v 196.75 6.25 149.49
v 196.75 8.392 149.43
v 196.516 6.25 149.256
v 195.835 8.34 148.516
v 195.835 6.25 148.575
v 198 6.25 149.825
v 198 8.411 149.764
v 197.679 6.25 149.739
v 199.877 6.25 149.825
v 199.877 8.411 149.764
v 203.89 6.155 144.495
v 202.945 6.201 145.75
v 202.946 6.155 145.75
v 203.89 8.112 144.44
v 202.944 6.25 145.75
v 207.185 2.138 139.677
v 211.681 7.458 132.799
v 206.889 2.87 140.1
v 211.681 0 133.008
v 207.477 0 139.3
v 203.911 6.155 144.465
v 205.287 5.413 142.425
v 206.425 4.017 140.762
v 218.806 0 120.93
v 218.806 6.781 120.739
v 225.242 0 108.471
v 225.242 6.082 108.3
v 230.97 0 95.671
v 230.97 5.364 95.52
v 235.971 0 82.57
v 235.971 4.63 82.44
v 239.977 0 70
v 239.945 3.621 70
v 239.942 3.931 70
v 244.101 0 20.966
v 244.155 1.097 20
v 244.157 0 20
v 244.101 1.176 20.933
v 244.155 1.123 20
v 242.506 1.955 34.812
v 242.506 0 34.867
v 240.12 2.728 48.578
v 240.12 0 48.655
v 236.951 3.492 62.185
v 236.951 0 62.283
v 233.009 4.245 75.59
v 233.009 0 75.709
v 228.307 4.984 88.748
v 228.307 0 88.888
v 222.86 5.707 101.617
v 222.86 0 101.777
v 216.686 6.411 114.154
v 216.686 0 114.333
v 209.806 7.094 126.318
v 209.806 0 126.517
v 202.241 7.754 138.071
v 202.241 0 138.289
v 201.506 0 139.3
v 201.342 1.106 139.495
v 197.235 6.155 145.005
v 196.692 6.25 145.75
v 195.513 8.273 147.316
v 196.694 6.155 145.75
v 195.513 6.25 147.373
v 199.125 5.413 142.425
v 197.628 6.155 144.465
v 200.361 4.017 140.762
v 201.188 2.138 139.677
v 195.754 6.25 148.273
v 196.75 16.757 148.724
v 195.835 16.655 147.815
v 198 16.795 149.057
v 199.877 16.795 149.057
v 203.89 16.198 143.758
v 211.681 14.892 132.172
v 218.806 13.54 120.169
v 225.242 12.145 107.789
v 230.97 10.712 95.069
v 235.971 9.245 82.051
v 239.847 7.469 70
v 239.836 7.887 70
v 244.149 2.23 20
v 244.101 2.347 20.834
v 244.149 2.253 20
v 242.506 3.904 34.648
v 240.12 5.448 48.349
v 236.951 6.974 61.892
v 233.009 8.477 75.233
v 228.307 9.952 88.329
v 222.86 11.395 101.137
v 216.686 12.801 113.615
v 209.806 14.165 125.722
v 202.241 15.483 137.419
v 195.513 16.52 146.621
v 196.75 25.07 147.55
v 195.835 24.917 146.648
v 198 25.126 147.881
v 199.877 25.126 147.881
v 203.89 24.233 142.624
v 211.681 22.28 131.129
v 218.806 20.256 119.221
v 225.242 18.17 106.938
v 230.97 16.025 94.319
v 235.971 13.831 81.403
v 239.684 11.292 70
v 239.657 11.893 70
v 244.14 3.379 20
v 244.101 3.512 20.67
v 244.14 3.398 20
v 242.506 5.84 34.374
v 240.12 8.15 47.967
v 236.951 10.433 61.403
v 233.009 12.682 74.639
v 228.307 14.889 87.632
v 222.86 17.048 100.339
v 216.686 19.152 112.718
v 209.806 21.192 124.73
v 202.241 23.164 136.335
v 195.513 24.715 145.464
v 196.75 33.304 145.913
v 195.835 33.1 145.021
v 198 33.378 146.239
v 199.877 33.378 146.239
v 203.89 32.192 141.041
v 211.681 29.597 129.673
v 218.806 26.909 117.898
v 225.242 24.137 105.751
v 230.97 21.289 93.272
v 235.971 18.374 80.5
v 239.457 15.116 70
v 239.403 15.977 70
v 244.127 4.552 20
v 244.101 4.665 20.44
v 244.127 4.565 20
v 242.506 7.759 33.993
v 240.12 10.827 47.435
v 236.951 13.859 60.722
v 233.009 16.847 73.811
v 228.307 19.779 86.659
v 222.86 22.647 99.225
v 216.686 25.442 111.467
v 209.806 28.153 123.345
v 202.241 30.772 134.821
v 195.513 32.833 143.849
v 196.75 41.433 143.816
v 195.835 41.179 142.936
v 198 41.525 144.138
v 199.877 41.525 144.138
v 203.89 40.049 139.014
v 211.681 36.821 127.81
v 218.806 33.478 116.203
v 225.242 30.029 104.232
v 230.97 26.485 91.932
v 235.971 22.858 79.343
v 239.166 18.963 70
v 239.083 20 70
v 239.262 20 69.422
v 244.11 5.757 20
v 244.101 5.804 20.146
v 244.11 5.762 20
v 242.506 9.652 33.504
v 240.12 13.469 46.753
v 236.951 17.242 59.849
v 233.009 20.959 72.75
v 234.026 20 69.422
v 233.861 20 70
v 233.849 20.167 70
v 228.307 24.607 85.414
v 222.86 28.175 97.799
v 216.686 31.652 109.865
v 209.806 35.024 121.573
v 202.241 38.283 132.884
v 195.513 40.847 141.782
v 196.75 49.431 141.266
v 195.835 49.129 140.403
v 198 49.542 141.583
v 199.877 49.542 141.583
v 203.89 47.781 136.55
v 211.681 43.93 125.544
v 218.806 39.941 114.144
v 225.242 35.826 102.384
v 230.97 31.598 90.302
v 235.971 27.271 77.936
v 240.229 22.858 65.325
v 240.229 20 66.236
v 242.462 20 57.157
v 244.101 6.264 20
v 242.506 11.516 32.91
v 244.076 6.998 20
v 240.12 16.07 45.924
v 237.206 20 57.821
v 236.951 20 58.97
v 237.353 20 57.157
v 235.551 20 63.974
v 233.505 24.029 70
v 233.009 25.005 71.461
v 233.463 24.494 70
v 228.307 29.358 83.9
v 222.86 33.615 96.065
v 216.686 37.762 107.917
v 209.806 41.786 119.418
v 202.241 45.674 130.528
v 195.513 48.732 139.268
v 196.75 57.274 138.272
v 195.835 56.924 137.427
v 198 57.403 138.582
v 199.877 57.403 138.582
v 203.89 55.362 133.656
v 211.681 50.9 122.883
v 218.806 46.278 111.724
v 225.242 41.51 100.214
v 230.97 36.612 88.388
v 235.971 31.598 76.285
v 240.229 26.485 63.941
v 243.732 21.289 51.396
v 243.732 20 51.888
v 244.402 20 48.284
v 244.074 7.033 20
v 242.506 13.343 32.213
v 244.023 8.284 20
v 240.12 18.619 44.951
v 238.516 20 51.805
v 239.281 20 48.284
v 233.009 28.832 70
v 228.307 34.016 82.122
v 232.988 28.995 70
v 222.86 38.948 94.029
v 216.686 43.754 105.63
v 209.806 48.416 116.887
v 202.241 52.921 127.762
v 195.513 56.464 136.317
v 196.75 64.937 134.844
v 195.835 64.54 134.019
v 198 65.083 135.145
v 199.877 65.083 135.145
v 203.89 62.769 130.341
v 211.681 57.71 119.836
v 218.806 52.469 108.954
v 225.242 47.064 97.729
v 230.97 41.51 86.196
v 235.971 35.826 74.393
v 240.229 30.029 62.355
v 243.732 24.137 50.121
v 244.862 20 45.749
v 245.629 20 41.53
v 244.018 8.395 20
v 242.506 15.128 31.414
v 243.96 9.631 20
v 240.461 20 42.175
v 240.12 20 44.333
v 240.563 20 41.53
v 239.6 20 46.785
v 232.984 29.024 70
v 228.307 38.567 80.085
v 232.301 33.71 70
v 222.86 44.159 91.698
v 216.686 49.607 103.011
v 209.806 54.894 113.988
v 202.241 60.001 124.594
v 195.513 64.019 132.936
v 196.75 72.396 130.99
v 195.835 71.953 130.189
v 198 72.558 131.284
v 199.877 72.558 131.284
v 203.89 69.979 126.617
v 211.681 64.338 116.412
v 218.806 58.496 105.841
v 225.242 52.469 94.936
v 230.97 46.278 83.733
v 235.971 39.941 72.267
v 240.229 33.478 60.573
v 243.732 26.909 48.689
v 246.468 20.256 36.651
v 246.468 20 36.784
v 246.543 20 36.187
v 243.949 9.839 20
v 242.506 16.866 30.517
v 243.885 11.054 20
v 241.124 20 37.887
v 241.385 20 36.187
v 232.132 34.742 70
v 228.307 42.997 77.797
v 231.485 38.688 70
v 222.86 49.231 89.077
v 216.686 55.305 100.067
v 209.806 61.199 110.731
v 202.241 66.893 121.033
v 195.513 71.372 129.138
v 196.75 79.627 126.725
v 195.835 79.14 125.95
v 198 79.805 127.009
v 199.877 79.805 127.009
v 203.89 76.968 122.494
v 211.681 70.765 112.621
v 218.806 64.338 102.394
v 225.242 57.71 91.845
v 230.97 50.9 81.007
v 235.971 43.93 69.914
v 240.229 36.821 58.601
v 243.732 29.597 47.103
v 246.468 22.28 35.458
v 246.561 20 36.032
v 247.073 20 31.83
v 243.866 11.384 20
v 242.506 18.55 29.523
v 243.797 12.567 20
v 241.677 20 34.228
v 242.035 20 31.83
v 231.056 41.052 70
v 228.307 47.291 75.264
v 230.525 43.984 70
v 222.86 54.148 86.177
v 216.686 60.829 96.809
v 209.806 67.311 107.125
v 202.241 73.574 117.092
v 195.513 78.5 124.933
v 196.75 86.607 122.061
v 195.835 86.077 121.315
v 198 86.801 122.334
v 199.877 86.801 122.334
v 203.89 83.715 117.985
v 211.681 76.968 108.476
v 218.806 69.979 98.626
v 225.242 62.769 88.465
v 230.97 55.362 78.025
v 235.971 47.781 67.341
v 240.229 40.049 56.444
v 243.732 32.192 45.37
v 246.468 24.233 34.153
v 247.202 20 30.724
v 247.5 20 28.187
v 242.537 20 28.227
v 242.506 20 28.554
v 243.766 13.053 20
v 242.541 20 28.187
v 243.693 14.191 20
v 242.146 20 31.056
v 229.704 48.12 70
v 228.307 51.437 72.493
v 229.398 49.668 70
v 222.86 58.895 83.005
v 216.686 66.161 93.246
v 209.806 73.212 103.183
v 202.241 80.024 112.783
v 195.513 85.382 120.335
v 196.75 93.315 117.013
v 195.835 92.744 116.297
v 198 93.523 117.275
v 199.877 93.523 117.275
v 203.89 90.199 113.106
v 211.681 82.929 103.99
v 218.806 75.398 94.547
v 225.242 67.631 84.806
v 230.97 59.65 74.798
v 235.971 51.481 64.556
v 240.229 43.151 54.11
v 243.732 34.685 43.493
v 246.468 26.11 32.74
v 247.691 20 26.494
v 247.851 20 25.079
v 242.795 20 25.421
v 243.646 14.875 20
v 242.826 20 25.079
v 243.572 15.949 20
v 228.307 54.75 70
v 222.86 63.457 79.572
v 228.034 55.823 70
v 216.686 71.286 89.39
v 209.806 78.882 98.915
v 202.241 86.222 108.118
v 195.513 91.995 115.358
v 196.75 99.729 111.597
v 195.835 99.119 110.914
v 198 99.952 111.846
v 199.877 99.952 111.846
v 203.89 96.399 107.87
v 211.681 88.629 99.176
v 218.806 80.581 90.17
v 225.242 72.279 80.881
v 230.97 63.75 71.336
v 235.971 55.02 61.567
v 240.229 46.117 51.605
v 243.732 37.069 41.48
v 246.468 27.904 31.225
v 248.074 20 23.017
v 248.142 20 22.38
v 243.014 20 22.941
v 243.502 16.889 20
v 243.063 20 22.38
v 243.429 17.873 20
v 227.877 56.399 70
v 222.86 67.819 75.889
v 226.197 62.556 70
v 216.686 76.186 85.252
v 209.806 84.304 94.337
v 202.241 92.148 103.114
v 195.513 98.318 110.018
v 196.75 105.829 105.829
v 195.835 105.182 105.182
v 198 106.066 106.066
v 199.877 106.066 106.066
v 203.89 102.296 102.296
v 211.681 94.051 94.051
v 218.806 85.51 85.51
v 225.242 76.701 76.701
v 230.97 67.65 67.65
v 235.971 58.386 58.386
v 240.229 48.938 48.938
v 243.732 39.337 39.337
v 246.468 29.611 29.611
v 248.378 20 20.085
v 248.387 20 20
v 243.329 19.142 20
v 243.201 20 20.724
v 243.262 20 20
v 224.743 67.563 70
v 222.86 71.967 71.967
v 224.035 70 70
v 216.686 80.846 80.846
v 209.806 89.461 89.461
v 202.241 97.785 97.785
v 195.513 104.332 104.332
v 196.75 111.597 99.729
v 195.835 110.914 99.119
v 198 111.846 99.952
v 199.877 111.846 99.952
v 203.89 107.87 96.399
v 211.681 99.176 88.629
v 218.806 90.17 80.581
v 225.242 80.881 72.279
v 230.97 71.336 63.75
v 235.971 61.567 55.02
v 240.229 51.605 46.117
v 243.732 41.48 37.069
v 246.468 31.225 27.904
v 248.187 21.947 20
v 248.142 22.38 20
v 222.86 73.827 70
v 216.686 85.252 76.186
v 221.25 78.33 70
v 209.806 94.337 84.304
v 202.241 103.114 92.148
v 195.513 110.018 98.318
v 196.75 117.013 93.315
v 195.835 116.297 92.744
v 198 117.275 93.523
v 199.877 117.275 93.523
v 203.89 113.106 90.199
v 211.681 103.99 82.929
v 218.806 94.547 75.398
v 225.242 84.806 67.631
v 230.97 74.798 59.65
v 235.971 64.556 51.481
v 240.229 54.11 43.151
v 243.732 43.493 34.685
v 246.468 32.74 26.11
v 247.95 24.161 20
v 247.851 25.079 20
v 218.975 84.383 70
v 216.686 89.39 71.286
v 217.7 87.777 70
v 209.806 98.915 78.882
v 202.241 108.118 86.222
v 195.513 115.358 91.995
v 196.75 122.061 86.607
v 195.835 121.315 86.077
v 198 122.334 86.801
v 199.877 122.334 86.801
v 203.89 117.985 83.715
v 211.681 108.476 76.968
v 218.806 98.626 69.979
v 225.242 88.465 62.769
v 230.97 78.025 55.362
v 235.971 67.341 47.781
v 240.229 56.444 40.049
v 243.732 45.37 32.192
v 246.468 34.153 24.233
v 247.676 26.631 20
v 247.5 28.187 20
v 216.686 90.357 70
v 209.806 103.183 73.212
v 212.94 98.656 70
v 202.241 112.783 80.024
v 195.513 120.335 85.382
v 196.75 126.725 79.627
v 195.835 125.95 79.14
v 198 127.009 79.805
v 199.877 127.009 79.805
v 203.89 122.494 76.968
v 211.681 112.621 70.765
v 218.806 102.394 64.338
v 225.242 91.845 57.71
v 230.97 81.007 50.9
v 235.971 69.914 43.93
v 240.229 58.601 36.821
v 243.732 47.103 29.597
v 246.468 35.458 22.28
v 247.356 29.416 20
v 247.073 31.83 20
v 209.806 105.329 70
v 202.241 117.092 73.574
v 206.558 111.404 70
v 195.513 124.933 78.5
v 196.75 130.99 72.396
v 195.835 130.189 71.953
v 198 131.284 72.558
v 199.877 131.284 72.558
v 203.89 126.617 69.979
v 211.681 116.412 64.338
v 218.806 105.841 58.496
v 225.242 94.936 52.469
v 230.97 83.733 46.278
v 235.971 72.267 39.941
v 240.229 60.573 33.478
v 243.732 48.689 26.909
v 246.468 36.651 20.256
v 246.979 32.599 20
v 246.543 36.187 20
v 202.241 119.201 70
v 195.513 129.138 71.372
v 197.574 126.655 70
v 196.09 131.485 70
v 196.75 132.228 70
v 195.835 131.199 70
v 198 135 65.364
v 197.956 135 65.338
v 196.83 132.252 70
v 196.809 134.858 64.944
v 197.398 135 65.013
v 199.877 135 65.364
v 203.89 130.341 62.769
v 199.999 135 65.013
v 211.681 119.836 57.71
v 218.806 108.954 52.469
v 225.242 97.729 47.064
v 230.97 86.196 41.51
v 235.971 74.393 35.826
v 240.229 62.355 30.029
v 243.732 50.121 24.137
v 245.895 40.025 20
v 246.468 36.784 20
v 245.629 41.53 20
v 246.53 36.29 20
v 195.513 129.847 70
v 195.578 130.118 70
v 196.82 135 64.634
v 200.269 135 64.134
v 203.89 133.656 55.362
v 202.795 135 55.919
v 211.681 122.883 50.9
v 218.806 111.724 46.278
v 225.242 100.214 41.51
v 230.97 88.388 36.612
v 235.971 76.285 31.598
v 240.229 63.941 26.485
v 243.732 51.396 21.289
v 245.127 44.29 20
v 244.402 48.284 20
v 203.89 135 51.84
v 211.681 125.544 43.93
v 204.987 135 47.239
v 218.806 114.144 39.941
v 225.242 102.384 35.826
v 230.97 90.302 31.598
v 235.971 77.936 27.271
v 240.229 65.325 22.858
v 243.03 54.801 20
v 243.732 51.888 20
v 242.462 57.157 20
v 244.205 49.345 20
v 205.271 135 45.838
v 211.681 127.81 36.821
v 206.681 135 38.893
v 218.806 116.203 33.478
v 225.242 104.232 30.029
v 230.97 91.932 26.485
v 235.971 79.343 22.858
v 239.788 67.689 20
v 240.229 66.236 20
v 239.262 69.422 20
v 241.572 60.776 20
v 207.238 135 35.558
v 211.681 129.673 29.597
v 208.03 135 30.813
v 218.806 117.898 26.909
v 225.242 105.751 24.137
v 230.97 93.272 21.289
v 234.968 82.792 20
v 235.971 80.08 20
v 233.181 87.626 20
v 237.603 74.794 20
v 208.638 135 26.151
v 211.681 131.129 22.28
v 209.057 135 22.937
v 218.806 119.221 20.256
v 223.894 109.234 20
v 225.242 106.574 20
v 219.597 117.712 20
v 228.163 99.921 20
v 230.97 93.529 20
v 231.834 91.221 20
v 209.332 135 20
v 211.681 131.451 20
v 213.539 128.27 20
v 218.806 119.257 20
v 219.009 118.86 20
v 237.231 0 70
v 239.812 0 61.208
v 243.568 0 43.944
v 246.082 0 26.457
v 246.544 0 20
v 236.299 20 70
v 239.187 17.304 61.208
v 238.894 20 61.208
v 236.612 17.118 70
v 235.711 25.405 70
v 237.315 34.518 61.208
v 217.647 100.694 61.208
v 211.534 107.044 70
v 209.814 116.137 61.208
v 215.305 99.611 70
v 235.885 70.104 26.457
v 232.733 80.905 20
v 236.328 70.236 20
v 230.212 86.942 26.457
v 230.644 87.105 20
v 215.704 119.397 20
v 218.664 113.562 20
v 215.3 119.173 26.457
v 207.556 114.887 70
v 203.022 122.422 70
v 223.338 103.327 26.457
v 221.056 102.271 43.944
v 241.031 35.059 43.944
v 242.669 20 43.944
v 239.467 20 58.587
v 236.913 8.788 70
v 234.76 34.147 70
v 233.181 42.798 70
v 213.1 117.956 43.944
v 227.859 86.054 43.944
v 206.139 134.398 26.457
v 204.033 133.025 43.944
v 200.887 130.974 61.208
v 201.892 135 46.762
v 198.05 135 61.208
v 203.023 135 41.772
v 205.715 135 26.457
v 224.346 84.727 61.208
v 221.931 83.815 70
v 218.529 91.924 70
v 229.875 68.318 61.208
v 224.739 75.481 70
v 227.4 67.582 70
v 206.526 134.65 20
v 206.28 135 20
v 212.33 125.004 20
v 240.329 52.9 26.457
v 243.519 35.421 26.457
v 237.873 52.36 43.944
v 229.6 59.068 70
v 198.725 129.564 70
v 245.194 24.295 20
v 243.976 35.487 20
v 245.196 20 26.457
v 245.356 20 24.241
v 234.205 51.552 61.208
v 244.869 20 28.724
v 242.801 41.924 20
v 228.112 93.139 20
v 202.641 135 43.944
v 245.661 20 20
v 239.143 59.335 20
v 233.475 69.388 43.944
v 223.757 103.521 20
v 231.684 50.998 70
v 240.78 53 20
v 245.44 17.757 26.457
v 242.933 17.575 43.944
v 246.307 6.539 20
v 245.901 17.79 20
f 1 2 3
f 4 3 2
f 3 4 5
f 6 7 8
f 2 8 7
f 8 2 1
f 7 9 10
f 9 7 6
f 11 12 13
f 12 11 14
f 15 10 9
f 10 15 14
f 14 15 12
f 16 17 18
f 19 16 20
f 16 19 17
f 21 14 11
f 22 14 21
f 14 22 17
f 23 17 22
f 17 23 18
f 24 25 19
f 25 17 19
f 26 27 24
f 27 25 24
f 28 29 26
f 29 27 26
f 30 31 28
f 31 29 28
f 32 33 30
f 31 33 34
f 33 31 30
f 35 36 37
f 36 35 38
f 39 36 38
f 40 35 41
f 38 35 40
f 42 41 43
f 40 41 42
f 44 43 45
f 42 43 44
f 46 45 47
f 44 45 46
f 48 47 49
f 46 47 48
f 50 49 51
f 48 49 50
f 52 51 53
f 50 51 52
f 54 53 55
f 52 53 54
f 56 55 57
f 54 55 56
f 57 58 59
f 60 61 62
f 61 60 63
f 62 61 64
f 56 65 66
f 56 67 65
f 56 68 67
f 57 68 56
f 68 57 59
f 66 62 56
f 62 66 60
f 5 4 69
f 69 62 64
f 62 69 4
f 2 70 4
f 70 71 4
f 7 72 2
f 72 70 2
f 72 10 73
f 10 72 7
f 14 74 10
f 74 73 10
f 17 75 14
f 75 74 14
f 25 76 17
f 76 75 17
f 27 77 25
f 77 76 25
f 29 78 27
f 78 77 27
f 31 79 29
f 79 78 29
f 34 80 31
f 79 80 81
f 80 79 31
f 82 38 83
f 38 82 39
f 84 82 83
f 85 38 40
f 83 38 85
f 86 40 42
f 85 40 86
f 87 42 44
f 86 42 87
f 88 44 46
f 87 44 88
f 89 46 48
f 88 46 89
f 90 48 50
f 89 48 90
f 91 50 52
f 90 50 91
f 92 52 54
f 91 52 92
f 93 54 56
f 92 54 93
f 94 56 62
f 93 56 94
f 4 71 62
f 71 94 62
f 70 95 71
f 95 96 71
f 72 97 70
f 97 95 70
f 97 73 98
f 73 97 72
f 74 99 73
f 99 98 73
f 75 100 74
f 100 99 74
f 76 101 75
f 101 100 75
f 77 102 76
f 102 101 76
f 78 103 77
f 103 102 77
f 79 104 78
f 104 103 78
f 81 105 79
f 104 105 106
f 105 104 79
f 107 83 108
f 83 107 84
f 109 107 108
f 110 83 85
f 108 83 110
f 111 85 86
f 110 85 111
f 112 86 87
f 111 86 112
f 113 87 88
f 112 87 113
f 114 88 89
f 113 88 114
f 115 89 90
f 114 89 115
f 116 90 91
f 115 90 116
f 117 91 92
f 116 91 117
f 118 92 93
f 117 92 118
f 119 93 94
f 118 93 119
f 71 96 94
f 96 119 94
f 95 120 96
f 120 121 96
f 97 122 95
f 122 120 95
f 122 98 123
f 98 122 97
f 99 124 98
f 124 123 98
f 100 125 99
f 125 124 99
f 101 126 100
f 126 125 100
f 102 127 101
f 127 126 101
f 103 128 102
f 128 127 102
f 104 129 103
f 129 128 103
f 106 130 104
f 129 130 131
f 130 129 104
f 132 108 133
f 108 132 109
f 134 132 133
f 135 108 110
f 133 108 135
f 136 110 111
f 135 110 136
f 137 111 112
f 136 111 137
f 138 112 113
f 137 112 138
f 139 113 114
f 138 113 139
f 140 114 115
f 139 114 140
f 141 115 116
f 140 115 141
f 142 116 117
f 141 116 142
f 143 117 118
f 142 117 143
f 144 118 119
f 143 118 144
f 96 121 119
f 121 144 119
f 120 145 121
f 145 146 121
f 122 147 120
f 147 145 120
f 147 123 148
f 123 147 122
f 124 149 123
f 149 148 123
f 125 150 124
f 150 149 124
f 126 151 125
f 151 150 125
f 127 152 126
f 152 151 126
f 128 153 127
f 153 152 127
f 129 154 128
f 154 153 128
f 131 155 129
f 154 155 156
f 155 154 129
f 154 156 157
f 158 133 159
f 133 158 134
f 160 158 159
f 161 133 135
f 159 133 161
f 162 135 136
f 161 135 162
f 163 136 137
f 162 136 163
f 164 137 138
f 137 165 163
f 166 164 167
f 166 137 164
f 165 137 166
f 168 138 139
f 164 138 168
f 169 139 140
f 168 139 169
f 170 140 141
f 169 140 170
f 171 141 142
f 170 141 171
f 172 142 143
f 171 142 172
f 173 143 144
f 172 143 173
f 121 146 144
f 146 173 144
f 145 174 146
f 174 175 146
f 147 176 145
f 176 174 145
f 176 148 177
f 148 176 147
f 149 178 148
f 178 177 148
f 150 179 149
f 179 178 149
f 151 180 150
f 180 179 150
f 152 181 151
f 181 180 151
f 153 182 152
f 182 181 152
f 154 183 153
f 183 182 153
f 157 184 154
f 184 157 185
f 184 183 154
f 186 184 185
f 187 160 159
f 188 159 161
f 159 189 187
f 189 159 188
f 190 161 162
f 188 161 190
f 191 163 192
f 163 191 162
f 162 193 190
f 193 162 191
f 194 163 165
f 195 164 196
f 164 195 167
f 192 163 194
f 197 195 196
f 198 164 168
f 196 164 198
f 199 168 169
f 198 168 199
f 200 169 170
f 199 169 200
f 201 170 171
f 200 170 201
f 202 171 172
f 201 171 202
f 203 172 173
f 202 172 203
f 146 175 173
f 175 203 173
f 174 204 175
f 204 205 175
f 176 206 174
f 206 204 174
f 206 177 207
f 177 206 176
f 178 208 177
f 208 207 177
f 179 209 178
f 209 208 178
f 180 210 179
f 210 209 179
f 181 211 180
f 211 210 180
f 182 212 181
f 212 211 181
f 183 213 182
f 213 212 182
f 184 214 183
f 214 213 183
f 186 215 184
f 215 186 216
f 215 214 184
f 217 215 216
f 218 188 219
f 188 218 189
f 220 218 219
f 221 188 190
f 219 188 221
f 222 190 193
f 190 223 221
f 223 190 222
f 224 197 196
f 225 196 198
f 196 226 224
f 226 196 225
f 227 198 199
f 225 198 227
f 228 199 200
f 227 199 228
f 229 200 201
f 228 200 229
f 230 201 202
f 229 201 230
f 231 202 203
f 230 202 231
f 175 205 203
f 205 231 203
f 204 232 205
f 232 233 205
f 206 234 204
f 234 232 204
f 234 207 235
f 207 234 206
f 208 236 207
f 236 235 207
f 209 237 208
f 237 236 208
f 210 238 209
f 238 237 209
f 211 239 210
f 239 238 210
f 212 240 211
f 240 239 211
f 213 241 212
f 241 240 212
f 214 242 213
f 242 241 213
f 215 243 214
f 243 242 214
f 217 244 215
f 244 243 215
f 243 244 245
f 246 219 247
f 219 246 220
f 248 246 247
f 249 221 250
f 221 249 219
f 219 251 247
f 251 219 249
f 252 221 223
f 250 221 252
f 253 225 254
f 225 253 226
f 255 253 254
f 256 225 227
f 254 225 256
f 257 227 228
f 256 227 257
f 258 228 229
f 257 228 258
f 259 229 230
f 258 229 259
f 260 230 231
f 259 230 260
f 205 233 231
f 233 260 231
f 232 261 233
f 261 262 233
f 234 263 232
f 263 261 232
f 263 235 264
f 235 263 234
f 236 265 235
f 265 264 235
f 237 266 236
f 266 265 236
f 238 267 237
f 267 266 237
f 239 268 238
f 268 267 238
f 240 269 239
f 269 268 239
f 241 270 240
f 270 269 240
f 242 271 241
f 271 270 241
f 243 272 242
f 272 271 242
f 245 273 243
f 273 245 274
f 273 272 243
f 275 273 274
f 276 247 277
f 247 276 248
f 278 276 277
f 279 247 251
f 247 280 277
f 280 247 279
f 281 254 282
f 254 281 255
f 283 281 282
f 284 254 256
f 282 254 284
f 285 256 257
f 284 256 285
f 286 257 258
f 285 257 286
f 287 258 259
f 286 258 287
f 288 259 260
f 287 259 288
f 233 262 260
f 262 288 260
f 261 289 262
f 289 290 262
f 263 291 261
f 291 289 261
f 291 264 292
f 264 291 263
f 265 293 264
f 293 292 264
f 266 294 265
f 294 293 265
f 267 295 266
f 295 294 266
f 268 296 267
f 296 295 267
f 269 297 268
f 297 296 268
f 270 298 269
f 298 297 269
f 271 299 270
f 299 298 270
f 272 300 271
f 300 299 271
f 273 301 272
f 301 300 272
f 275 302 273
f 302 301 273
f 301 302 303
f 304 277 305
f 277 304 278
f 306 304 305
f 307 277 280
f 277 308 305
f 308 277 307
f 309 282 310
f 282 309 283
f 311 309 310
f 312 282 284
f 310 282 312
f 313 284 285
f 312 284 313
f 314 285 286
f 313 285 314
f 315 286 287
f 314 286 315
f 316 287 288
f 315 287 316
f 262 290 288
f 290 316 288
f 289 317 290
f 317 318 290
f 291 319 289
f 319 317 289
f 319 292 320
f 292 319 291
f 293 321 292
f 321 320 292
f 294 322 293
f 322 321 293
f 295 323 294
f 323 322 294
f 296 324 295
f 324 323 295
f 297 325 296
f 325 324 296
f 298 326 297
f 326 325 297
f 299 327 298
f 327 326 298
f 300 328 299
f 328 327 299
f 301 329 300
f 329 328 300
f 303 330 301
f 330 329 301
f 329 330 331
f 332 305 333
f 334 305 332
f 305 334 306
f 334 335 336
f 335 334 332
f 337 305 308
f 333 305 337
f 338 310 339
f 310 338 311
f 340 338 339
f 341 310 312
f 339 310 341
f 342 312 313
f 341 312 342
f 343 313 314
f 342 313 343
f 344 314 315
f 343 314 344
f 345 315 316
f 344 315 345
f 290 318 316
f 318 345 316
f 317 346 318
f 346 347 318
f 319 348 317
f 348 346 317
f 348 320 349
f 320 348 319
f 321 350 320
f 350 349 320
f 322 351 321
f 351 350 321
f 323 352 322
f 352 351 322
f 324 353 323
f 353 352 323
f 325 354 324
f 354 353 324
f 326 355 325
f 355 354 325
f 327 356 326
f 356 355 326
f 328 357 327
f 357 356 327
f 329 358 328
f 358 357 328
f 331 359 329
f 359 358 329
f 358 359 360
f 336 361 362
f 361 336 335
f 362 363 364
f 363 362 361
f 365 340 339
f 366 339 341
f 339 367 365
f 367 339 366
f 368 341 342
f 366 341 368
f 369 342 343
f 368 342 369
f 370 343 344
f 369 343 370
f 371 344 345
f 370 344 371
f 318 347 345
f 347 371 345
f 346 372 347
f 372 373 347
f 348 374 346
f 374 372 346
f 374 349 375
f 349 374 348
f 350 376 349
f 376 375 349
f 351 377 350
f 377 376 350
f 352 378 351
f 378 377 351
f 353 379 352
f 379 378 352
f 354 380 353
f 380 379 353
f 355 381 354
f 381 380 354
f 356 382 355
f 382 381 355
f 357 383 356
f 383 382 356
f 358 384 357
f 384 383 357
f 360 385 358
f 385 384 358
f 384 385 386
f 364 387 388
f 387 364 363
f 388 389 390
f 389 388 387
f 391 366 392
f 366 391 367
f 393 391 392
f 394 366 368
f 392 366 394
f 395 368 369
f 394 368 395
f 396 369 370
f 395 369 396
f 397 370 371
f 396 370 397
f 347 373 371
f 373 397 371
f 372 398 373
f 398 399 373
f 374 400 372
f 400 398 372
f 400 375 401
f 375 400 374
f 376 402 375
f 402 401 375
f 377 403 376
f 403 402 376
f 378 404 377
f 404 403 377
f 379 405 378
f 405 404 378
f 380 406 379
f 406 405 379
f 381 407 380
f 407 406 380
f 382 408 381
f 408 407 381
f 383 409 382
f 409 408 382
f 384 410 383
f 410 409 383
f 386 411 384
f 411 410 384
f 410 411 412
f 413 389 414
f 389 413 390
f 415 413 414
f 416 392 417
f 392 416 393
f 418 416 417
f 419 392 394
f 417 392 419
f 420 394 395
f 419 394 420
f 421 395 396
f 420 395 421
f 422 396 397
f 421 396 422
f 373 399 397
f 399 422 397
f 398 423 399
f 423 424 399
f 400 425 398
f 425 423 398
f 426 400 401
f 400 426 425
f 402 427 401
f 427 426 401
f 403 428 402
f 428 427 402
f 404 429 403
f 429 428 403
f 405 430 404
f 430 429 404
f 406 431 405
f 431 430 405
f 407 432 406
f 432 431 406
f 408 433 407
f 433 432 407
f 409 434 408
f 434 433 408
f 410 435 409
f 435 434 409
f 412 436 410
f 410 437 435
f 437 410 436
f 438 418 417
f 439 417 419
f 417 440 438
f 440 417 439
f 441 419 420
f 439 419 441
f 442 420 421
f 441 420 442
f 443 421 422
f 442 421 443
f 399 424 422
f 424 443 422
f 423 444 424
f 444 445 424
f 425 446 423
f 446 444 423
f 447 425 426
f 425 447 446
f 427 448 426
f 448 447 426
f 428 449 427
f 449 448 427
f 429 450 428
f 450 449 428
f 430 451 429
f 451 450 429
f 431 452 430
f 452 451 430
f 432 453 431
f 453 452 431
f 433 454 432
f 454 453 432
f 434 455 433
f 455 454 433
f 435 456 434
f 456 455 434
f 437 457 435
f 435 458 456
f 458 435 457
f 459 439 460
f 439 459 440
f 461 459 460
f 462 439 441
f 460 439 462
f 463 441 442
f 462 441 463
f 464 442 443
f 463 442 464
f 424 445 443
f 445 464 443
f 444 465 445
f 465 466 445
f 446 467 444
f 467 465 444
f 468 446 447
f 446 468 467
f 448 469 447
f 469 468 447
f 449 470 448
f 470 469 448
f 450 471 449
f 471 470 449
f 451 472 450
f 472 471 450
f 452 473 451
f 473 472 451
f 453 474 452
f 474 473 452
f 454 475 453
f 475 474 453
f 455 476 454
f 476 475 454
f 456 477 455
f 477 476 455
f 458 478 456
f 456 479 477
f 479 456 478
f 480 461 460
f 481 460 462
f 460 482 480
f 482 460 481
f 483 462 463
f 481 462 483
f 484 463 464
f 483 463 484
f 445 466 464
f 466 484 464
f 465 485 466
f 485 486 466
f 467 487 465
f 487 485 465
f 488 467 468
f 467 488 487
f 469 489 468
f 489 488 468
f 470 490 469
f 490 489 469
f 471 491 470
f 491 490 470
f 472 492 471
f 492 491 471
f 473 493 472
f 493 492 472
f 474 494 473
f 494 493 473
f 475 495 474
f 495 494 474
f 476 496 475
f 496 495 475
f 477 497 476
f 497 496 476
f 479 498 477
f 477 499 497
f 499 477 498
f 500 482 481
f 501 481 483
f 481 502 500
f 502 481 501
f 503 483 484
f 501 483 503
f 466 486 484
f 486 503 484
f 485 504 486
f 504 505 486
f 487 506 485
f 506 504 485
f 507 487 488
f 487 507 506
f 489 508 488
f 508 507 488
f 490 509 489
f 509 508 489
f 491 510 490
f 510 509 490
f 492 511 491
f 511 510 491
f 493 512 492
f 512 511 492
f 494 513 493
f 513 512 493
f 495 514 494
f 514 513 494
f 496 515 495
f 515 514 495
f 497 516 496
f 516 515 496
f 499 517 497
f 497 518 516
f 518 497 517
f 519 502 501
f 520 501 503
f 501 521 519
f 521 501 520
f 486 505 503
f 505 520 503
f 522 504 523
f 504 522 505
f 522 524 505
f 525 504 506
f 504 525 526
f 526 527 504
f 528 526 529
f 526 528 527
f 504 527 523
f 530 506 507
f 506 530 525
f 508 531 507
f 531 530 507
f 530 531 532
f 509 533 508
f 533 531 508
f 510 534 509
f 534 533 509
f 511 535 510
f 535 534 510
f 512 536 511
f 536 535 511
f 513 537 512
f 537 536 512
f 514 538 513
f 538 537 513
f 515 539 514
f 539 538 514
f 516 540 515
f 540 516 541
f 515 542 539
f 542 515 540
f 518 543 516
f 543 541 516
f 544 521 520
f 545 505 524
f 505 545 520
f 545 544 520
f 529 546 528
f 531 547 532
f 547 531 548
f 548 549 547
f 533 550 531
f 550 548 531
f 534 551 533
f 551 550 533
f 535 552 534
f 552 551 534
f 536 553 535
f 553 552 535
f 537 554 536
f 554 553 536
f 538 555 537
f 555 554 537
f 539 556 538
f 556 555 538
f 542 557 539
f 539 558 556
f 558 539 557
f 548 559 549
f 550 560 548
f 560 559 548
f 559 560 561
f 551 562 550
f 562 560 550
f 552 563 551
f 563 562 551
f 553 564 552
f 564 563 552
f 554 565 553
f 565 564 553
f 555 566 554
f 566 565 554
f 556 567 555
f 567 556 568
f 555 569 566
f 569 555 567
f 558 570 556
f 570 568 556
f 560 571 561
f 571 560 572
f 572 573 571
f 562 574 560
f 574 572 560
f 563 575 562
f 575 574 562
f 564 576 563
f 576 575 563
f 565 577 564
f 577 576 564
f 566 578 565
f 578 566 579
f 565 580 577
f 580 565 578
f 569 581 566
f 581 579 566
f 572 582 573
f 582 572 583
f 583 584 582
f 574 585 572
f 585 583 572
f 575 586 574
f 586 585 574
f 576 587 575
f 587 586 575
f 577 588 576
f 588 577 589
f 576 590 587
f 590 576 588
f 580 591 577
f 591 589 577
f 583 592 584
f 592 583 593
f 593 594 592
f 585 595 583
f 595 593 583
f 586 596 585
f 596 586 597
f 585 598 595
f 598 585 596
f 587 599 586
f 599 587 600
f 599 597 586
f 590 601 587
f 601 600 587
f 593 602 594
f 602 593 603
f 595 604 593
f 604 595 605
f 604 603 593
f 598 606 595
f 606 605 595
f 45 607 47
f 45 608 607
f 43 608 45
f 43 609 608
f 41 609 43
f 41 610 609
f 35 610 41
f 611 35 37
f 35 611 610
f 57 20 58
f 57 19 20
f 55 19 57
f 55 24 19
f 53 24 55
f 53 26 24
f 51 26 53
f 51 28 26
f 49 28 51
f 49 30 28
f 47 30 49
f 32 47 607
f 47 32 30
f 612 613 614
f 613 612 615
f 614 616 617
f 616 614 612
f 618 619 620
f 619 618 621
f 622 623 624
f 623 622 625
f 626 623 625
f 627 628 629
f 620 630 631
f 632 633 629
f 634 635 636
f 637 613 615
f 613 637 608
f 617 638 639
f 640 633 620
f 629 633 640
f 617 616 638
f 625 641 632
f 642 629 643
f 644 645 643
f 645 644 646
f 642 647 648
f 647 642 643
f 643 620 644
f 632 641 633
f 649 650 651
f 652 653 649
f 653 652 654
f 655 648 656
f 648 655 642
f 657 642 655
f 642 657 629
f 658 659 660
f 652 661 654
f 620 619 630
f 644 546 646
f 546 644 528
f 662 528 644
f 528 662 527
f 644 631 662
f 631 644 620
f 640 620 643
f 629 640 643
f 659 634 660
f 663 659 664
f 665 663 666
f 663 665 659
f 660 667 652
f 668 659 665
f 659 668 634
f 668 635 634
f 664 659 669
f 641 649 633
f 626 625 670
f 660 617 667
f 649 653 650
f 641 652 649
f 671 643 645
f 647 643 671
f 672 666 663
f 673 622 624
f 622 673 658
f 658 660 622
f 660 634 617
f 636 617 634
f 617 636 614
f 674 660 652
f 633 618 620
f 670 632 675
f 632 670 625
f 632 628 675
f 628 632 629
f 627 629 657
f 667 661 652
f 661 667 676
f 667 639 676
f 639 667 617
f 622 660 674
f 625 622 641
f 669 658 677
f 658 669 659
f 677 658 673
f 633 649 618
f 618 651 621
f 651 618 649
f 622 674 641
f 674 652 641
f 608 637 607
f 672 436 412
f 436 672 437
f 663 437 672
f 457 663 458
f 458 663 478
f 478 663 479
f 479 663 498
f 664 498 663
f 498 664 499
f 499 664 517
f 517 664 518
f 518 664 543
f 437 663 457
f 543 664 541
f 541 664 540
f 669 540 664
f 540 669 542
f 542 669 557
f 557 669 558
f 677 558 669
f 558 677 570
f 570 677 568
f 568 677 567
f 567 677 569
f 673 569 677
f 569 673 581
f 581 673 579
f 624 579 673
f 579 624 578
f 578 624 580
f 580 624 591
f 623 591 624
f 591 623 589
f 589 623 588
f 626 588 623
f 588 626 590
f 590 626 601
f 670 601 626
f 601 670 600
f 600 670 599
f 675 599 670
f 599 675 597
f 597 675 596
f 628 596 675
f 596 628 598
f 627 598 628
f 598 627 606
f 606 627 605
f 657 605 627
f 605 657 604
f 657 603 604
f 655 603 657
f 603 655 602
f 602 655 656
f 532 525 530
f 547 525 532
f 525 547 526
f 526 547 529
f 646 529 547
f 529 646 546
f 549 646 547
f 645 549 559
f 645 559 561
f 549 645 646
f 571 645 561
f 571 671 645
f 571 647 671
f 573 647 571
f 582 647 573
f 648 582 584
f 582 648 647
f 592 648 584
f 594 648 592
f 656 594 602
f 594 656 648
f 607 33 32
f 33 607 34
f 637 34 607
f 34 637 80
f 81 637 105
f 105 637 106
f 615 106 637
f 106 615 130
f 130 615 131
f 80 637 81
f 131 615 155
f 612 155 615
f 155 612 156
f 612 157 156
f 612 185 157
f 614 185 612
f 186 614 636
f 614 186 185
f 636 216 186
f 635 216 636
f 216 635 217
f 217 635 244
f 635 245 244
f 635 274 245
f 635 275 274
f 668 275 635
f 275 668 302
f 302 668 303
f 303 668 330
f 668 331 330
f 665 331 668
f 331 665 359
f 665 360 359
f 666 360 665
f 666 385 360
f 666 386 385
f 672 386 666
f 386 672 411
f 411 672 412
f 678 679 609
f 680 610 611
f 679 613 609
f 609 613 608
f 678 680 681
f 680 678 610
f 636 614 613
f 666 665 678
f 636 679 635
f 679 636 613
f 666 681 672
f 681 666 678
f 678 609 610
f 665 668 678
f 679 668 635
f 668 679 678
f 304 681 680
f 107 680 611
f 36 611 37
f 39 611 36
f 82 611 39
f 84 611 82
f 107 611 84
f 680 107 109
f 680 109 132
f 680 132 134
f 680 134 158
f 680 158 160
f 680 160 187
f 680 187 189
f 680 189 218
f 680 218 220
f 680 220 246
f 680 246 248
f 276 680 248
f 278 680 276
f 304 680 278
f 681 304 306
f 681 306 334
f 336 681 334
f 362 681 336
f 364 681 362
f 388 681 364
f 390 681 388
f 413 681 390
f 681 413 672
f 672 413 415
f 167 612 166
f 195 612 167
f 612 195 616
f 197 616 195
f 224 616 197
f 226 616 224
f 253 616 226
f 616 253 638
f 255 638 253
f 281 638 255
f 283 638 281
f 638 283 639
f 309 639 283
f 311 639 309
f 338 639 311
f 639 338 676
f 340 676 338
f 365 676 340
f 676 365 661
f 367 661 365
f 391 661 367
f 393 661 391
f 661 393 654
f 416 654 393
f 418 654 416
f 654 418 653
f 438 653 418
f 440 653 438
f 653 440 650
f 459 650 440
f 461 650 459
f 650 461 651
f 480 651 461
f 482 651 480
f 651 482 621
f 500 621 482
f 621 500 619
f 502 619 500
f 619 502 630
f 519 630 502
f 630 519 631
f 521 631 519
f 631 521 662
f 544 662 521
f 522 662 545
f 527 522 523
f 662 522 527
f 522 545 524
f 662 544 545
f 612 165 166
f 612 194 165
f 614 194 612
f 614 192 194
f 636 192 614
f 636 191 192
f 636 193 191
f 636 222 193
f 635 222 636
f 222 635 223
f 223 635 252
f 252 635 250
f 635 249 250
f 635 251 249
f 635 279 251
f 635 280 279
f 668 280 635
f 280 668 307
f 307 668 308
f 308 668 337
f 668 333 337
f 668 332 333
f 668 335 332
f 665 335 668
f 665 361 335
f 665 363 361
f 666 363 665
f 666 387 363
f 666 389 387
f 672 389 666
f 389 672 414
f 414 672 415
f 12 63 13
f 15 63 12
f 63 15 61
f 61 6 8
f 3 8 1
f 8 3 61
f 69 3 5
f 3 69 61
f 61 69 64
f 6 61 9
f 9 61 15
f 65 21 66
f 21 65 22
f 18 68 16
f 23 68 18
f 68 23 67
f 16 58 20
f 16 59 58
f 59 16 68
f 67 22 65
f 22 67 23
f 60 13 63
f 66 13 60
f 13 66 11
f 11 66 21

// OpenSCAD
// file: ../motors/MN5212.scad
use <../utils.scad>

module MN5212(){

	render(){
		translate([0,0, 42.5 / 2 - 23 / 2 - 4.9 - 6])
			cylinder(
				h = 23,
				r = 59 / 2,
				$fa = fa(59 / 2),
				center = true);
		translate([0,0, 42.5 / 2 - 4.9 / 2 - 6])
			cylinder(
				h = 4.9,
				r1 = 59 / 2,
				r2 = 24.8 / 2,
				$fa = fa(59 / 2),
				center = true);
		translate([0,0, - 42.5 / 2 + 5.6 / 2 + 3])
			cylinder(
				h = 5.6,
				r1 = 44 / 2,
				r2 = 59 / 2,
				$fa = fa(59 / 2),
				center = true);
		translate([0, 0, 42.5 / 2 - 3])
			cylinder(
				h = 6,
				r = 4 / 2,
				$fa = fa(4 / 2),
				center = true);
		translate([0, 0, - 42.5 / 2 + 1.5])
			cylinder(
				h = 3,
				r = 6 / 2,
				$fa = fa(6 / 2),
				center = true);
	}

}
// file: ../servos/HS_5065MG.scad
use <../utils.scad>

module HS_5065MG(){

	length = 23.75;
	width = 11.68;
	depth = 20.32;
	wing_width = 32.38;
	wing_thick = 3.43;
	shaft_offset = 6;
	hole_spacing = 28.32;
	shaft_height = 26.16;
	shaft_length = 2;

	module mounting_hole(){
		mh_rad = 2 / 2;
		translate(
			[
				hole_spacing / 2,
				0,
				depth / 2 - wing_thick / 2
			])
			cylinder(h = 5, r = mh_rad, $fa = fa(mh_rad), center = true);
	}

	difference(){
		union(){
			cube([length, width, depth], center = true);
			translate([0, 0, depth / 2 - wing_thick / 2])
				cube([wing_width, width, wing_thick], center = true);
			translate(
				[
					- length / 2 + shaft_offset,
					0,
					shaft_height - length / 2 + shaft_length / 2
				])
				cylinder(
					h = shaft_length,
					r = 1.5,
					$fa = fa(1.5),
					center = true);
		}	union(){

			mounting_hole();
			mirror() mounting_hole();
		}
	}
}

HS_5065MG();
// file: ../servos/LS_0006_servo.scad
// Author Michael Marques (DrYerzinia)

use <../utils.scad>

module ls_0006_servo(){
	
	length = 21.4;
	depth = 19.9;
	thickness = 11.65;

	gear_height = 2.6;
	gear_bump_height = 0.7;
	gear_bump_diameter = 1.97;
	gear_outer_bump_diameter = 6;
	gear_bump_offset = 12.2;

	shaft_height = 2.4;
	shaft_diameter = 3.74;
	shaft_offset = thickness / 2;
	shaft_screw_diameter = 1.3;
	
	wing_outer_width = 8.5;
	wing_top_off = 3.8;
	wing_length = 3.8;
	wing_thickness = 1.2;
	wing_hole_diameter = 1.85;
	wing_hole_edge_dist = 2;

	module wing_hole(){
		translate(
			[
				length / 2 + wing_hole_edge_dist,
				0,
				depth/2 - wing_top_off - wing_thickness / 2
			])
			cylinder(
				h = wing_thickness + 1,
				r = wing_hole_diameter / 2,
				$fn = 16,
				center = true);
	}

	module wing(){
		translate(
			[
				length / 2,
				thickness / 2,
				depth/2 - wing_top_off - wing_thickness
			])
			rotate([0,0,-90])
				trapezoid(
					thickness,
					wing_outer_width,
					wing_length,
					wing_thickness);
	}

	// Body
	cube([length, thickness, depth], center = true);

	difference(){
		union(){

			wing();
			mirror() wing();

			// Gear Bumps
			translate([0, 0, depth/2 + gear_height / 2]){
				translate([length / 2 - gear_bump_offset, 0, 0])
					cylinder(
						h = gear_height,
						r = gear_outer_bump_diameter / 2,
						$fn = 16,
						center = true);
				translate([length / 2 - gear_bump_offset, 0, gear_height/2 + gear_bump_height / 2])
					cylinder(
						h = gear_bump_height,
						r = gear_bump_diameter / 2,
						$fn = 16,
						center = true);
				translate([length / 2 - shaft_offset, 0, 0])
					cylinder(
						h = gear_height,
						r = thickness / 2,
						$fn = 32,
						center = true);
				// Shaft
				translate([length / 2 - shaft_offset, 0, gear_height])
					cylinder(
						h = shaft_height,
						r = shaft_diameter / 2,
						$fn = 16,
						center = true);
			}

		}
		union(){

			wing_hole();
			mirror() wing_hole();

			// Shaft_hole
			translate(
				[
					length / 2 - shaft_offset,
					0,
					depth/2 + gear_height * (3 / 2) + 0.5])
				cylinder(
					h = shaft_height + 1,
					r = shaft_screw_diameter / 2,
					$fn = 16,
					center = true);

		}
	}

}

module translate_ls_0006_attachment(){

	length = 21.4;
	thickness = 11.65;
	shaft_offset = thickness / 2;
	depth = 19.9;
	float = 3.3;

	translate([length / 2 - shaft_offset, 0, depth / 2 + float])
		children();

}

module bar_attachment(){

	height = 3.75;
	bar_length = 14.7;
	bar_thickness = 1.6;
	inner_radius = 5.9;
	outer_radius = 3.95;
	shaft_diameter = 3.7;
	upper_void_diameter = 4.8;
	screw_diameter = 2;
	hole_spacing = 2;
	hole_4_diameter = 1.2;
	hole_diameter = 1;
	hole_start_off = 4.7;
	top_void_depth = 0.67;
	bottom_void_depth = 1.84;

	translate([0, 0, height / 2]){
		difference(){
			union(){

				translate([0, inner_radius / 2, height / 2 - bar_thickness])
					rotate([0,0,-90])
						trapezoid(
							inner_radius,
							outer_radius,
							bar_length,
							bar_thickness);

				cylinder(
					h = height,
					r = inner_radius / 2,
					$fn = 16,
					center = true);

				translate([bar_length, 0, height / 2 - bar_thickness / 2])
					cylinder(
						h = bar_thickness,
						r = outer_radius / 2,
						$fn = 16,
						center = true);

			}
			union(){
				// screwhole
				cylinder(
					h = height + 1,
					r = screw_diameter / 2,
					$fn = 16,
					center = true);
				// voids
				translate([0, 0, height / 2 - top_void_depth / 2 + 0.5])
					cylinder(
						h = top_void_depth + 1,
						r = upper_void_diameter / 2,
						$fn = 16,
						center = true);
				translate([0, 0,  - bottom_void_depth / 2 - 0.5])
					cylinder(
						h = bottom_void_depth + 1,
						r = shaft_diameter / 2,
						$fn = 16,
						center = true);

				for(i = [0:4]){
					dia = (i != 3) ? hole_diameter : hole_4_diameter;
					translate(
						[
							hole_start_off + hole_spacing * i,
							0,
							height / 2 - bar_thickness / 2])
						cylinder(
							h = bar_thickness + 1,
							r = dia / 2,
							$fn = 16,
							center = true);
				}

			}
		}
	}

}

ls_0006_servo();
translate_ls_0006_attachment() bar_attachment();
// file: ../servos/parallax_continuous_rotation_servo.scad
// Author Michael Marques (DrYerzinia)

module parallax_continuous_rotation_servo(){

	depth = 37.7;
	length = 40.75;
	width = 19.75;

	mount_height = 2.7;
	mount_extent = 6.1;
	mount_from_top = 7.7;

	mount_hole_diameter = 4.46;
	mount_hole_spacing = 14.4 - mount_hole_diameter;

	shaft_diameter = 5.8;
	shaft_offset = 10;
	shaft_length = 3.5;

	module mounting_hole(){

			translate(
				[
					length / 2 + 5,
					mount_hole_spacing / 2,
					depth / 2 - mount_height / 2 - mount_from_top
				]
				)
				cylinder(
					h = mount_height + 1,
					r = mount_hole_diameter / 2,
					$fn=16,
					center = true);
	}

	difference(){
		union(){

			// Body
			cube([length,width,depth], center = true);

			// Mounting wings
			translate(
				[
					0,
					0,
					depth / 2 - mount_height / 2 - mount_from_top
				])
				cube(
					[
						length + mount_extent * 2,
						width,
						mount_height
					],
					center = true);

			// Shaft
			translate(
				[
					length / 2 - shaft_offset,
					0,
					depth / 2 + shaft_length / 2
				]
				)
				cylinder(
					h = shaft_length,
					r = shaft_diameter / 2,
					$fn = 16,
					center = true
				);

		}
		union(){

			// Mounting Holes
			mounting_hole();
			mirror()
				mounting_hole();

			translate([0,-mount_hole_spacing,0]){
				mounting_hole();
				mirror()
					mounting_hole();
			}
		}
	}

}

module translate_shaft(){

	depth = 37.7;
	length = 40.75;

	shaft_offset = 10;

	translate(
		[
			length / 2 - shaft_offset,
			0,
			depth / 2
		])
		children();
}

module round_servo_attachment(){

	height = 6;
	diameter = 20.8;
	inner_diameter = 8.6;
	plate_thickness = 2.45;

	float = 2;

	depth = 37.7;
	length = 40.75;

	shaft_offset = 10;

	plate_hole_spacing = 14.5;
	plate_hole_diameter = 1.4;
	plate_hole_minor_spacing = 3.5;

	screw_hole_diameter = 3;

	inner_diameter = 8;
	
	top_depth = 1.8;
	bottom_depth = 3.4;

	void_diameter = 5.8;

	module plate_hole(){
		cylinder(
			h = plate_thickness + 1,
			r = plate_hole_diameter / 2,
			$fn = 16,
			center = true
		);
	}

	module plate_hole_group(){
		translate([0, 0, height / 2 - plate_thickness / 2]){
			translate([0, plate_hole_spacing / 2, 0]){
					plate_hole();
					translate([- plate_hole_minor_spacing, 0, 0])
						plate_hole();
					translate([  plate_hole_minor_spacing, 0, 0])
						plate_hole();
			}
		}
	}

	translate(
		[
			length / 2 - shaft_offset,
			0,
			depth / 2 + height / 2 + float
		]
		)
		difference(){

			union(){

				// inner shaft
				cylinder(
					h = height,
					r = inner_diameter / 2,
					$fn = 16,
					center = true
				);

				// top
				translate([0, 0, height / 2 - plate_thickness / 2])
					cylinder(
						h = plate_thickness,
						r = diameter / 2,
						$fn = 32,
						center = true
					);
			}

			union(){

				// plate holes
				for(ang = [0:3]){
					rotate([0,0, ang * 90])
						plate_hole_group();
				}

				// screw hole
				cylinder(
					h = height + 1,
					r = screw_hole_diameter / 2,
					$fn = 16,
					center = true
				);

				// inner voids
				translate([0, 0, height / 2 - top_depth / 2 + 1])
					cylinder(
						h = top_depth + 1,
						r = void_diameter / 2,
						$fn = 16,
						center = true
					);
				translate([0, 0, -1])
					cylinder(
						h = bottom_depth + 1,
						r = void_diameter / 2,
						$fn = 16,
						center = true
					);

			}

		}

}

parallax_continuous_rotation_servo();
round_servo_attachment();
// file: ../hardware.scad
 // Author Michael Marques (DrYerzinia)

// http://www.ebay.com/itm/10-PCS-683-3x7x2-mm-Metal-OPEN-PRECISION-Miniature-Ball-Bearing-3-7-2-/291206307942?hash=item43cd3fa066:m:mCi6eovrGVk_CjIUjlhw8yg
// E-Bay empire.rc

module washer_M3_7x3_2x0_5mm(){

	difference(){
		cylinder(
			h = 0.5,
			r = 7 / 2,
			$fn = 16,
			center = true);
		cylinder(
			h = 0.5 + 0.1,
			r = 3.2 / 2,
			$fn = 16,
			center = true);
	}

}

module bearing_3x7x2mm(){

	difference(){
		cylinder(
			h = 2,
			r = 7 / 2,
			$fn = 16,
			center = true);
		cylinder(
			h = 2 + 1,
			r = 3 / 2,
			$fn = 16,
			center = true);
	}

}

module bearing_5x8x2_5mm(){

	difference(){
		cylinder(
			h = 2.5,
			r = 8 / 2,
			$fn = 16,
			center = true);
		cylinder(
			h = 2.5 + 1,
			r = 5 / 2,
			$fn = 16,
			center = true);
	}

}

module bearing_8x16x5mm(){

	difference(){
		cylinder(
			h = 5,
			r = 16 / 2,
			$fn = 16,
			center = true);
		cylinder(
			h = 5 + 1,
			r = 8 / 2,
			$fn = 16,
			center = true);
	}

}


bearing_5x8x2_5mm();
// file: ../utils.scad
// http://forum.openscad.org/Creating-pie-pizza-slice-shape-need-a-dynamic-length-array-td3148.html

module pie_slice(r, start_angle, end_angle) {
    R = r * sqrt(2) + 1;
    a0 = (4 * start_angle + 0 * end_angle) / 4;
    a1 = (3 * start_angle + 1 * end_angle) / 4;
    a2 = (2 * start_angle + 2 * end_angle) / 4;
    a3 = (1 * start_angle + 3 * end_angle) / 4;
    a4 = (0 * start_angle + 4 * end_angle) / 4;
    if(end_angle > start_angle)
        intersection() {
        circle(r, $fa = fa(r));
        polygon([
            [0,0],
            [R * cos(a0), R * sin(a0)],
            [R * cos(a1), R * sin(a1)],
            [R * cos(a2), R * sin(a2)],
            [R * cos(a3), R * sin(a3)],
            [R * cos(a4), R * sin(a4)],
            [0,0]
       ]);
    }
}

// https://github.com/openscad/openscad/issues/29

module rotate_about(v,a) {
	translate(v) rotate(a) translate(-v) children(0);
}

module rotate_about_axis(v, ang, axis) {
	translate(v) rotate(ang, axis) translate(-v) children(0);
}

// https://github.com/robofun/openscad-utils/blob/master/trapezoid.scad

module trapezoid(width_base, width_top,height,thickness) {
	

  linear_extrude(height = thickness) polygon(points=[[0,0],[width_base,0],[width_base-(width_base-width_top)/2,height],[(width_base-width_top)/2,height]], paths=[[0,1,2,3]]); 
  
}

// http://forum.openscad.org/fe-Tolerance-based-arc-approximation-td14212.html

function fa(r)=($fn>0)?360/$fn:($fe>0)?($fe<r)?min(45,2*acos(1-$fe/r)):45:$fa; 
// file: ../render_settings.scad
// Author Michael Marques (DrYerzinia)

// Lulzbot Mini tolerances
// x/y 0.1mm
// z   0.05mm
//
// 0.1mm   preview tolerance
// 0.025mm export  tolerance

$fs = 0.01;
$fn = undef;
$fa = 360 / 5;

$fe = 0.025;	// export
// main file
// Author Michael Marques (DrYerzinia)

include <../render_settings.scad>

use <../BB8.scad>

Door_P2();
